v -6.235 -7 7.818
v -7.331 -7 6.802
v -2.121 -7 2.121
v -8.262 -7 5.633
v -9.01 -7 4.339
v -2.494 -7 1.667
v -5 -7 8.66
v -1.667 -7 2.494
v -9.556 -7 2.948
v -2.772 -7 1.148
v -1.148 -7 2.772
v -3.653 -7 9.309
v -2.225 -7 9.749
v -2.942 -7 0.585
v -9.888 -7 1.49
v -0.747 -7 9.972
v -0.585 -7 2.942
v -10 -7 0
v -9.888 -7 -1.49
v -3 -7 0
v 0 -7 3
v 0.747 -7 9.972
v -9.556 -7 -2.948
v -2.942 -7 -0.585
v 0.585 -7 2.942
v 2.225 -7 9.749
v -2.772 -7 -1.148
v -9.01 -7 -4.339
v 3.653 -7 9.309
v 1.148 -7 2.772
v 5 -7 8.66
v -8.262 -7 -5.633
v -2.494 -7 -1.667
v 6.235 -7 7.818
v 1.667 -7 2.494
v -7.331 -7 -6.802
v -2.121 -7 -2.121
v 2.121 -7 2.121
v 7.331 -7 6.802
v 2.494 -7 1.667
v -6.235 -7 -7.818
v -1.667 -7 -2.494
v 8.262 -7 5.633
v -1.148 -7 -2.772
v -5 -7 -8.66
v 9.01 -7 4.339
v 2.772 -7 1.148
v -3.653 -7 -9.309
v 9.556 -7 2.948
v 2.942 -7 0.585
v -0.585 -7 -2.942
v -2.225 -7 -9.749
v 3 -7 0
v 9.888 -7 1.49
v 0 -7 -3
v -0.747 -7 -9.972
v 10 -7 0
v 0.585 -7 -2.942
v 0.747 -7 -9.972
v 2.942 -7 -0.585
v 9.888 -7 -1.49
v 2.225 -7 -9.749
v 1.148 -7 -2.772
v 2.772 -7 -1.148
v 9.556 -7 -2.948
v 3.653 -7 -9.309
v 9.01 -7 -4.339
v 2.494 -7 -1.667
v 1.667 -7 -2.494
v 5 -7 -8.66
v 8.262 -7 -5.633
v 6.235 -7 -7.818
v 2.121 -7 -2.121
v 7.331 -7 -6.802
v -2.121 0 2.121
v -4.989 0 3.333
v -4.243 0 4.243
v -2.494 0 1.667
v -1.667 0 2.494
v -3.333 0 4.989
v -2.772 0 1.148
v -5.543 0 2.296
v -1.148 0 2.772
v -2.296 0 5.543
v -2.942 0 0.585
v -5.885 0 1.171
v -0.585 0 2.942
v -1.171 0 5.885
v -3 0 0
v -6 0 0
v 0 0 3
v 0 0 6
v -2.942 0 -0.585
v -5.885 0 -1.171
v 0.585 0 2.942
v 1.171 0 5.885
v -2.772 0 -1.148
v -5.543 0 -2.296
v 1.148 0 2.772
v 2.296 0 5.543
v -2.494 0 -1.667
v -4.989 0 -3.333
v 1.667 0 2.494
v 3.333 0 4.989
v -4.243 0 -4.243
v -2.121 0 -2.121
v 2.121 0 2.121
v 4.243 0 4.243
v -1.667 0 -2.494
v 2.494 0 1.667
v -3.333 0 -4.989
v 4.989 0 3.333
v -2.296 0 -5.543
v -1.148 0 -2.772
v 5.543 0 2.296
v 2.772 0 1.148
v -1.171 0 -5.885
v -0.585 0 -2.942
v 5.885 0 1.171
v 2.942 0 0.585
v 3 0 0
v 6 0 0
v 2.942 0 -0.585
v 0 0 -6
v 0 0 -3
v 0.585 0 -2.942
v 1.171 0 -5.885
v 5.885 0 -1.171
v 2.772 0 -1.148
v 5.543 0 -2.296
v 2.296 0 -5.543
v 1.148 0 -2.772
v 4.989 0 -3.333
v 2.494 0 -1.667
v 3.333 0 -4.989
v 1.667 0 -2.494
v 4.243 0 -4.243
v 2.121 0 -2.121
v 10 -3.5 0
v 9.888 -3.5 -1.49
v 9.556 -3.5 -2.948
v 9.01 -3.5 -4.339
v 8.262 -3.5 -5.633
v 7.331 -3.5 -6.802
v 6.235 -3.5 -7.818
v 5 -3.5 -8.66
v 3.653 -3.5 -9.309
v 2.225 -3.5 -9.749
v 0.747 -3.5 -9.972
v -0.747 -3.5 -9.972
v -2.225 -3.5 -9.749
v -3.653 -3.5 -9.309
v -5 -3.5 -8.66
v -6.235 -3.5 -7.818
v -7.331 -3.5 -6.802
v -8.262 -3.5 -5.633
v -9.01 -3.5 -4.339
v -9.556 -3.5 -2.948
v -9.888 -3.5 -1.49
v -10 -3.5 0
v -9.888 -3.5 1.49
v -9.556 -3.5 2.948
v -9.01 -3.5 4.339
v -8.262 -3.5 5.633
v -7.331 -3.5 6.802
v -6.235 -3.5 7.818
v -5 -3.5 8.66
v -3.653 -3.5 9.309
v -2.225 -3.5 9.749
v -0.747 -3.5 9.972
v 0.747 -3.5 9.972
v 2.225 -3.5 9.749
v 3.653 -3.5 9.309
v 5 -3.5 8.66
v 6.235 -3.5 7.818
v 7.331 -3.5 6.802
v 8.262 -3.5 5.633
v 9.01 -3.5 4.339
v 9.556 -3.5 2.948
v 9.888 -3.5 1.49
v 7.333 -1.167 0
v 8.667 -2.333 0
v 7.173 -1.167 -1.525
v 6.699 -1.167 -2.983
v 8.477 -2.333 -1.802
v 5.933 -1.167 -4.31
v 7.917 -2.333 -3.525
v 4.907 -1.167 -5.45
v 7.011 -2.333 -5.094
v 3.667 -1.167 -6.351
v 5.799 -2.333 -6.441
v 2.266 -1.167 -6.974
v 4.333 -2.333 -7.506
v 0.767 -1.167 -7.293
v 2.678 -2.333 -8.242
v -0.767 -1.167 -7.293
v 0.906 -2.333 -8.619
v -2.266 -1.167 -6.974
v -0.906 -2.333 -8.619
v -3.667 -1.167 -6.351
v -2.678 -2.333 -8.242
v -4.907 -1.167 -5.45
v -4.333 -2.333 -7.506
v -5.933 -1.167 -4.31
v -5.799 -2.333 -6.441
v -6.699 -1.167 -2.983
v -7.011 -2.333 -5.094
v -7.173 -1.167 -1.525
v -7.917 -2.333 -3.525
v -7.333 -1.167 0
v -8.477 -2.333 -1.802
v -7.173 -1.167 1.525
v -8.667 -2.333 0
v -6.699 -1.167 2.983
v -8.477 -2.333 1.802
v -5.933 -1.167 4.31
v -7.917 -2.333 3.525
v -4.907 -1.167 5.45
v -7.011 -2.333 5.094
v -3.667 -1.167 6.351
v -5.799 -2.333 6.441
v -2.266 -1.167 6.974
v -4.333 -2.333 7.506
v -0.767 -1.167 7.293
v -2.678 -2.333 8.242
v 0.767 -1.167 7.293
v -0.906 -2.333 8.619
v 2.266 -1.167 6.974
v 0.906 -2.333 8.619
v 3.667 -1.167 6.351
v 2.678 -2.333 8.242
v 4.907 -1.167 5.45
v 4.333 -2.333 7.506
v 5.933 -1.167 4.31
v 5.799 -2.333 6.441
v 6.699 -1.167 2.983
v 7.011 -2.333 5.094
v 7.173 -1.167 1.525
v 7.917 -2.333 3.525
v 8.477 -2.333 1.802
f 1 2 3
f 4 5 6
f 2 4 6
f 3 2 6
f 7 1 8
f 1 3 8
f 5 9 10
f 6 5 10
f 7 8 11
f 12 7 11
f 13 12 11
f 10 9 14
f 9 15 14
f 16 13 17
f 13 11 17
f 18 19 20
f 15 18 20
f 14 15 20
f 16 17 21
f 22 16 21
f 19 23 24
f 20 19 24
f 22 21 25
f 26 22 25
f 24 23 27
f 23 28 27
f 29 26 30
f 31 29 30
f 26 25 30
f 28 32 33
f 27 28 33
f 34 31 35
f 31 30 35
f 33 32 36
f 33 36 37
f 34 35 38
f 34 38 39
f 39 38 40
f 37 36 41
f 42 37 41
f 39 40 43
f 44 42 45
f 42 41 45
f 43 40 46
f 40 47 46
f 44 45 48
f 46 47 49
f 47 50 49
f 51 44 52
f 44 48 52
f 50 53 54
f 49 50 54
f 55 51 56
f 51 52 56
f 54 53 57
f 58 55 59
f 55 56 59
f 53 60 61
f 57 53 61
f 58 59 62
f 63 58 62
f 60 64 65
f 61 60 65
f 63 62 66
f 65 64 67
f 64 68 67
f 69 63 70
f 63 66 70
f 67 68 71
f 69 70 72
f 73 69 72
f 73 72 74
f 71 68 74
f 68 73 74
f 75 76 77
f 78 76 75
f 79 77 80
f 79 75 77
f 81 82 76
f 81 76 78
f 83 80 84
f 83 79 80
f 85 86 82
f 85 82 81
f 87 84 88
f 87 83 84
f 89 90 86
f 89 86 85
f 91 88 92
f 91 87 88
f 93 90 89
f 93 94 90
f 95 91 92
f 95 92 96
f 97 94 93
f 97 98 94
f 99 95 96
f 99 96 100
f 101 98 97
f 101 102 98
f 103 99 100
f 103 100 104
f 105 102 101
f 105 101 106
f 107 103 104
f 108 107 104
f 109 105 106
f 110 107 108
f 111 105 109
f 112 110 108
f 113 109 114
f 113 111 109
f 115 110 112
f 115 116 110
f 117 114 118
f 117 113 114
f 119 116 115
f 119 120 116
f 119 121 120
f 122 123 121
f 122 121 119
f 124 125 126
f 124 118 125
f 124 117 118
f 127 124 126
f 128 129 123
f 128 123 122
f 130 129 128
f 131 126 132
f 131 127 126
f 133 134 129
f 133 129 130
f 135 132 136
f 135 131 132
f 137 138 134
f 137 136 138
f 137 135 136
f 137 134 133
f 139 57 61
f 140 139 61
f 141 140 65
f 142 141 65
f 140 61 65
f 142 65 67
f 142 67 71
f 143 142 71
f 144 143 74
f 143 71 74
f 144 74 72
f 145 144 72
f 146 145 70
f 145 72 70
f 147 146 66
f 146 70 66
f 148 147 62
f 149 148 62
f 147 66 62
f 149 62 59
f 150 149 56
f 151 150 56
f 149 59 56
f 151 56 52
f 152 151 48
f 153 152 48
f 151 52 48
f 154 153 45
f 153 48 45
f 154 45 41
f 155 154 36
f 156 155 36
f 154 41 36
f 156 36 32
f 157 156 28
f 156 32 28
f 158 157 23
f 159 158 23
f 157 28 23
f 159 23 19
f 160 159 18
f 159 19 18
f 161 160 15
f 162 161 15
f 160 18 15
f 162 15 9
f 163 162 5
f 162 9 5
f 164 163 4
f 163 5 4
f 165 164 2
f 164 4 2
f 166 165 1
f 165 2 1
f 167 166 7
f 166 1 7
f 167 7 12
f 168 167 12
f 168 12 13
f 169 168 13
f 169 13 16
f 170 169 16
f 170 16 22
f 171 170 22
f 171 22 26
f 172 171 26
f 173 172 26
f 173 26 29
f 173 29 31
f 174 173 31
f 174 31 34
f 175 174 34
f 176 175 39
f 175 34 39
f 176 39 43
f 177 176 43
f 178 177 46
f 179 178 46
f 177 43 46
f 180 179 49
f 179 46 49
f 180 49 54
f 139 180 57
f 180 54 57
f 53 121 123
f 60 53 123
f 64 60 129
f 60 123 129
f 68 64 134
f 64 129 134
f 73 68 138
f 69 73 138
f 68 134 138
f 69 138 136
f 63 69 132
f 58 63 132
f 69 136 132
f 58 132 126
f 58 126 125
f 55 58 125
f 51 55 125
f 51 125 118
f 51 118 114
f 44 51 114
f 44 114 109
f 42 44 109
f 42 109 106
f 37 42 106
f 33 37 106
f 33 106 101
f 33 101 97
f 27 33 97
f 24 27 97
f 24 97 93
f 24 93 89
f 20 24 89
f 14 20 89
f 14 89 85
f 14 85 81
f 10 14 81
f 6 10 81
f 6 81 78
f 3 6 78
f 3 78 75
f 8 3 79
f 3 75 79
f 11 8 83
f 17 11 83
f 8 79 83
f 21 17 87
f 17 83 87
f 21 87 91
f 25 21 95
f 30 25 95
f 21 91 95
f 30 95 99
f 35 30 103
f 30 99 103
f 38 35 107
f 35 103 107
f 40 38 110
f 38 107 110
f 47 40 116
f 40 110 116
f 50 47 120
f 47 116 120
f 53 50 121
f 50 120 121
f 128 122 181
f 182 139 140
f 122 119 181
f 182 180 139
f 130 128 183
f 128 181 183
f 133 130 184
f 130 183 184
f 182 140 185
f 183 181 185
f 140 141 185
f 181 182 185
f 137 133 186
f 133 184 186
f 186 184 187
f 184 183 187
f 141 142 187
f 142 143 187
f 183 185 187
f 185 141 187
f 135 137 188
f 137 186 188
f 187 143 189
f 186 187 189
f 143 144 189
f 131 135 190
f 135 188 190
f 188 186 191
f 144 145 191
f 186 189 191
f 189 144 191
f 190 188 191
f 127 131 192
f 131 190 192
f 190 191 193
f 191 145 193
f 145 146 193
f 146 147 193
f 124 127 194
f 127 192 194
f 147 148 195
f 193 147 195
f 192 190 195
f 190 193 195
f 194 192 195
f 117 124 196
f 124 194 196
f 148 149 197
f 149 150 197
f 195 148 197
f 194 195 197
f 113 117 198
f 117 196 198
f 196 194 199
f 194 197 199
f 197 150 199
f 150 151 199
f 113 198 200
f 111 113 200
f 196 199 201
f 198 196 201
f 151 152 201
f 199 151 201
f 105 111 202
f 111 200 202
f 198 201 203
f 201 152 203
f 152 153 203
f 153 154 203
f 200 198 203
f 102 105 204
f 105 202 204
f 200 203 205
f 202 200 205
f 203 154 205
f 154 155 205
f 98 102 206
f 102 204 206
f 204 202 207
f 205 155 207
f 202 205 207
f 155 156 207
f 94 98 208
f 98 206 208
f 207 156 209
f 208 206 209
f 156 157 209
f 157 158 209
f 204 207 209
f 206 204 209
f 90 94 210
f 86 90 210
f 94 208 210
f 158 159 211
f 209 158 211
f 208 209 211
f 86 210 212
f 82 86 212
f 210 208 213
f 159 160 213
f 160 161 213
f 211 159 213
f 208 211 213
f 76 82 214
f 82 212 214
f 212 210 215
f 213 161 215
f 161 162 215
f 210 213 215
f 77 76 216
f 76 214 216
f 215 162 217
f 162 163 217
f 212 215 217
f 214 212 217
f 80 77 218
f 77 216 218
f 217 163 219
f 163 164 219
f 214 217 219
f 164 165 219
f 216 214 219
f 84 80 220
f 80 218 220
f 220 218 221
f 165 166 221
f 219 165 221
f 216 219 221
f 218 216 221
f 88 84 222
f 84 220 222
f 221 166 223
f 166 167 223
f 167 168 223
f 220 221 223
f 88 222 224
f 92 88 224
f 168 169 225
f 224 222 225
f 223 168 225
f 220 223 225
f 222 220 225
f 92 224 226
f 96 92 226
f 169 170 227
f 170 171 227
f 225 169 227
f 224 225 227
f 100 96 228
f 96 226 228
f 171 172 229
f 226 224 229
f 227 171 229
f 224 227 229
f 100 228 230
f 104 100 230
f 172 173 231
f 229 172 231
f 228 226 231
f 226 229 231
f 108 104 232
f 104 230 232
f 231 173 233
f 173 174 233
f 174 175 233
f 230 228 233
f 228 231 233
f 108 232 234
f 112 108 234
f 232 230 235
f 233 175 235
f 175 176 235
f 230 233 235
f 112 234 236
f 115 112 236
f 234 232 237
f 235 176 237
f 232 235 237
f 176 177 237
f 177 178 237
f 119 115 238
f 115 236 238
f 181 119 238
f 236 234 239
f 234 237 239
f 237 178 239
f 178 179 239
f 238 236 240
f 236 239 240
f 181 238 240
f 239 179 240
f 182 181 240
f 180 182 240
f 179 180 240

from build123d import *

# Parameters (mm, degrees)
SKETCH2_R           = 10
BOSS_EXTRUDE1_DEPTH = 3.5
SKETCH1_R           = 6
SKETCH3_R           = 3
CUT_EXTRUDE1_DEPTH  = 9.5


with BuildPart() as part:
    # Sketch2 → Boss-Extrude1 (new body)
    with BuildSketch(Plane(origin=(0, -7, 0), x_dir=(1, 0, 0), z_dir=(0, 1, 0))):
        Circle(SKETCH2_R)
    extrude(amount=BOSS_EXTRUDE1_DEPTH)

    # Sketch1 → section 0 of loft1
    with BuildSketch(Plane(origin=(0, 0, 0), x_dir=(1, 0, 0), z_dir=(0, 1, 0)), mode=Mode.PRIVATE) as loft1_s0:
        Circle(SKETCH1_R)
    # loft up to a face of the part (loft1)
    loft([loft1_s0.sketch, part.faces().sort_by_distance((0, -3.5, 0))[0]])

    # Sketch3 → Cut-Extrude1 (cut)
    with BuildSketch(Plane(origin=(0, 0, 0), x_dir=(1, 0, 0), z_dir=(0, 1, 0))):
        Circle(SKETCH3_R)
    extrude(amount=-CUT_EXTRUDE1_DEPTH, mode=Mode.SUBTRACT)


solid = part.part
